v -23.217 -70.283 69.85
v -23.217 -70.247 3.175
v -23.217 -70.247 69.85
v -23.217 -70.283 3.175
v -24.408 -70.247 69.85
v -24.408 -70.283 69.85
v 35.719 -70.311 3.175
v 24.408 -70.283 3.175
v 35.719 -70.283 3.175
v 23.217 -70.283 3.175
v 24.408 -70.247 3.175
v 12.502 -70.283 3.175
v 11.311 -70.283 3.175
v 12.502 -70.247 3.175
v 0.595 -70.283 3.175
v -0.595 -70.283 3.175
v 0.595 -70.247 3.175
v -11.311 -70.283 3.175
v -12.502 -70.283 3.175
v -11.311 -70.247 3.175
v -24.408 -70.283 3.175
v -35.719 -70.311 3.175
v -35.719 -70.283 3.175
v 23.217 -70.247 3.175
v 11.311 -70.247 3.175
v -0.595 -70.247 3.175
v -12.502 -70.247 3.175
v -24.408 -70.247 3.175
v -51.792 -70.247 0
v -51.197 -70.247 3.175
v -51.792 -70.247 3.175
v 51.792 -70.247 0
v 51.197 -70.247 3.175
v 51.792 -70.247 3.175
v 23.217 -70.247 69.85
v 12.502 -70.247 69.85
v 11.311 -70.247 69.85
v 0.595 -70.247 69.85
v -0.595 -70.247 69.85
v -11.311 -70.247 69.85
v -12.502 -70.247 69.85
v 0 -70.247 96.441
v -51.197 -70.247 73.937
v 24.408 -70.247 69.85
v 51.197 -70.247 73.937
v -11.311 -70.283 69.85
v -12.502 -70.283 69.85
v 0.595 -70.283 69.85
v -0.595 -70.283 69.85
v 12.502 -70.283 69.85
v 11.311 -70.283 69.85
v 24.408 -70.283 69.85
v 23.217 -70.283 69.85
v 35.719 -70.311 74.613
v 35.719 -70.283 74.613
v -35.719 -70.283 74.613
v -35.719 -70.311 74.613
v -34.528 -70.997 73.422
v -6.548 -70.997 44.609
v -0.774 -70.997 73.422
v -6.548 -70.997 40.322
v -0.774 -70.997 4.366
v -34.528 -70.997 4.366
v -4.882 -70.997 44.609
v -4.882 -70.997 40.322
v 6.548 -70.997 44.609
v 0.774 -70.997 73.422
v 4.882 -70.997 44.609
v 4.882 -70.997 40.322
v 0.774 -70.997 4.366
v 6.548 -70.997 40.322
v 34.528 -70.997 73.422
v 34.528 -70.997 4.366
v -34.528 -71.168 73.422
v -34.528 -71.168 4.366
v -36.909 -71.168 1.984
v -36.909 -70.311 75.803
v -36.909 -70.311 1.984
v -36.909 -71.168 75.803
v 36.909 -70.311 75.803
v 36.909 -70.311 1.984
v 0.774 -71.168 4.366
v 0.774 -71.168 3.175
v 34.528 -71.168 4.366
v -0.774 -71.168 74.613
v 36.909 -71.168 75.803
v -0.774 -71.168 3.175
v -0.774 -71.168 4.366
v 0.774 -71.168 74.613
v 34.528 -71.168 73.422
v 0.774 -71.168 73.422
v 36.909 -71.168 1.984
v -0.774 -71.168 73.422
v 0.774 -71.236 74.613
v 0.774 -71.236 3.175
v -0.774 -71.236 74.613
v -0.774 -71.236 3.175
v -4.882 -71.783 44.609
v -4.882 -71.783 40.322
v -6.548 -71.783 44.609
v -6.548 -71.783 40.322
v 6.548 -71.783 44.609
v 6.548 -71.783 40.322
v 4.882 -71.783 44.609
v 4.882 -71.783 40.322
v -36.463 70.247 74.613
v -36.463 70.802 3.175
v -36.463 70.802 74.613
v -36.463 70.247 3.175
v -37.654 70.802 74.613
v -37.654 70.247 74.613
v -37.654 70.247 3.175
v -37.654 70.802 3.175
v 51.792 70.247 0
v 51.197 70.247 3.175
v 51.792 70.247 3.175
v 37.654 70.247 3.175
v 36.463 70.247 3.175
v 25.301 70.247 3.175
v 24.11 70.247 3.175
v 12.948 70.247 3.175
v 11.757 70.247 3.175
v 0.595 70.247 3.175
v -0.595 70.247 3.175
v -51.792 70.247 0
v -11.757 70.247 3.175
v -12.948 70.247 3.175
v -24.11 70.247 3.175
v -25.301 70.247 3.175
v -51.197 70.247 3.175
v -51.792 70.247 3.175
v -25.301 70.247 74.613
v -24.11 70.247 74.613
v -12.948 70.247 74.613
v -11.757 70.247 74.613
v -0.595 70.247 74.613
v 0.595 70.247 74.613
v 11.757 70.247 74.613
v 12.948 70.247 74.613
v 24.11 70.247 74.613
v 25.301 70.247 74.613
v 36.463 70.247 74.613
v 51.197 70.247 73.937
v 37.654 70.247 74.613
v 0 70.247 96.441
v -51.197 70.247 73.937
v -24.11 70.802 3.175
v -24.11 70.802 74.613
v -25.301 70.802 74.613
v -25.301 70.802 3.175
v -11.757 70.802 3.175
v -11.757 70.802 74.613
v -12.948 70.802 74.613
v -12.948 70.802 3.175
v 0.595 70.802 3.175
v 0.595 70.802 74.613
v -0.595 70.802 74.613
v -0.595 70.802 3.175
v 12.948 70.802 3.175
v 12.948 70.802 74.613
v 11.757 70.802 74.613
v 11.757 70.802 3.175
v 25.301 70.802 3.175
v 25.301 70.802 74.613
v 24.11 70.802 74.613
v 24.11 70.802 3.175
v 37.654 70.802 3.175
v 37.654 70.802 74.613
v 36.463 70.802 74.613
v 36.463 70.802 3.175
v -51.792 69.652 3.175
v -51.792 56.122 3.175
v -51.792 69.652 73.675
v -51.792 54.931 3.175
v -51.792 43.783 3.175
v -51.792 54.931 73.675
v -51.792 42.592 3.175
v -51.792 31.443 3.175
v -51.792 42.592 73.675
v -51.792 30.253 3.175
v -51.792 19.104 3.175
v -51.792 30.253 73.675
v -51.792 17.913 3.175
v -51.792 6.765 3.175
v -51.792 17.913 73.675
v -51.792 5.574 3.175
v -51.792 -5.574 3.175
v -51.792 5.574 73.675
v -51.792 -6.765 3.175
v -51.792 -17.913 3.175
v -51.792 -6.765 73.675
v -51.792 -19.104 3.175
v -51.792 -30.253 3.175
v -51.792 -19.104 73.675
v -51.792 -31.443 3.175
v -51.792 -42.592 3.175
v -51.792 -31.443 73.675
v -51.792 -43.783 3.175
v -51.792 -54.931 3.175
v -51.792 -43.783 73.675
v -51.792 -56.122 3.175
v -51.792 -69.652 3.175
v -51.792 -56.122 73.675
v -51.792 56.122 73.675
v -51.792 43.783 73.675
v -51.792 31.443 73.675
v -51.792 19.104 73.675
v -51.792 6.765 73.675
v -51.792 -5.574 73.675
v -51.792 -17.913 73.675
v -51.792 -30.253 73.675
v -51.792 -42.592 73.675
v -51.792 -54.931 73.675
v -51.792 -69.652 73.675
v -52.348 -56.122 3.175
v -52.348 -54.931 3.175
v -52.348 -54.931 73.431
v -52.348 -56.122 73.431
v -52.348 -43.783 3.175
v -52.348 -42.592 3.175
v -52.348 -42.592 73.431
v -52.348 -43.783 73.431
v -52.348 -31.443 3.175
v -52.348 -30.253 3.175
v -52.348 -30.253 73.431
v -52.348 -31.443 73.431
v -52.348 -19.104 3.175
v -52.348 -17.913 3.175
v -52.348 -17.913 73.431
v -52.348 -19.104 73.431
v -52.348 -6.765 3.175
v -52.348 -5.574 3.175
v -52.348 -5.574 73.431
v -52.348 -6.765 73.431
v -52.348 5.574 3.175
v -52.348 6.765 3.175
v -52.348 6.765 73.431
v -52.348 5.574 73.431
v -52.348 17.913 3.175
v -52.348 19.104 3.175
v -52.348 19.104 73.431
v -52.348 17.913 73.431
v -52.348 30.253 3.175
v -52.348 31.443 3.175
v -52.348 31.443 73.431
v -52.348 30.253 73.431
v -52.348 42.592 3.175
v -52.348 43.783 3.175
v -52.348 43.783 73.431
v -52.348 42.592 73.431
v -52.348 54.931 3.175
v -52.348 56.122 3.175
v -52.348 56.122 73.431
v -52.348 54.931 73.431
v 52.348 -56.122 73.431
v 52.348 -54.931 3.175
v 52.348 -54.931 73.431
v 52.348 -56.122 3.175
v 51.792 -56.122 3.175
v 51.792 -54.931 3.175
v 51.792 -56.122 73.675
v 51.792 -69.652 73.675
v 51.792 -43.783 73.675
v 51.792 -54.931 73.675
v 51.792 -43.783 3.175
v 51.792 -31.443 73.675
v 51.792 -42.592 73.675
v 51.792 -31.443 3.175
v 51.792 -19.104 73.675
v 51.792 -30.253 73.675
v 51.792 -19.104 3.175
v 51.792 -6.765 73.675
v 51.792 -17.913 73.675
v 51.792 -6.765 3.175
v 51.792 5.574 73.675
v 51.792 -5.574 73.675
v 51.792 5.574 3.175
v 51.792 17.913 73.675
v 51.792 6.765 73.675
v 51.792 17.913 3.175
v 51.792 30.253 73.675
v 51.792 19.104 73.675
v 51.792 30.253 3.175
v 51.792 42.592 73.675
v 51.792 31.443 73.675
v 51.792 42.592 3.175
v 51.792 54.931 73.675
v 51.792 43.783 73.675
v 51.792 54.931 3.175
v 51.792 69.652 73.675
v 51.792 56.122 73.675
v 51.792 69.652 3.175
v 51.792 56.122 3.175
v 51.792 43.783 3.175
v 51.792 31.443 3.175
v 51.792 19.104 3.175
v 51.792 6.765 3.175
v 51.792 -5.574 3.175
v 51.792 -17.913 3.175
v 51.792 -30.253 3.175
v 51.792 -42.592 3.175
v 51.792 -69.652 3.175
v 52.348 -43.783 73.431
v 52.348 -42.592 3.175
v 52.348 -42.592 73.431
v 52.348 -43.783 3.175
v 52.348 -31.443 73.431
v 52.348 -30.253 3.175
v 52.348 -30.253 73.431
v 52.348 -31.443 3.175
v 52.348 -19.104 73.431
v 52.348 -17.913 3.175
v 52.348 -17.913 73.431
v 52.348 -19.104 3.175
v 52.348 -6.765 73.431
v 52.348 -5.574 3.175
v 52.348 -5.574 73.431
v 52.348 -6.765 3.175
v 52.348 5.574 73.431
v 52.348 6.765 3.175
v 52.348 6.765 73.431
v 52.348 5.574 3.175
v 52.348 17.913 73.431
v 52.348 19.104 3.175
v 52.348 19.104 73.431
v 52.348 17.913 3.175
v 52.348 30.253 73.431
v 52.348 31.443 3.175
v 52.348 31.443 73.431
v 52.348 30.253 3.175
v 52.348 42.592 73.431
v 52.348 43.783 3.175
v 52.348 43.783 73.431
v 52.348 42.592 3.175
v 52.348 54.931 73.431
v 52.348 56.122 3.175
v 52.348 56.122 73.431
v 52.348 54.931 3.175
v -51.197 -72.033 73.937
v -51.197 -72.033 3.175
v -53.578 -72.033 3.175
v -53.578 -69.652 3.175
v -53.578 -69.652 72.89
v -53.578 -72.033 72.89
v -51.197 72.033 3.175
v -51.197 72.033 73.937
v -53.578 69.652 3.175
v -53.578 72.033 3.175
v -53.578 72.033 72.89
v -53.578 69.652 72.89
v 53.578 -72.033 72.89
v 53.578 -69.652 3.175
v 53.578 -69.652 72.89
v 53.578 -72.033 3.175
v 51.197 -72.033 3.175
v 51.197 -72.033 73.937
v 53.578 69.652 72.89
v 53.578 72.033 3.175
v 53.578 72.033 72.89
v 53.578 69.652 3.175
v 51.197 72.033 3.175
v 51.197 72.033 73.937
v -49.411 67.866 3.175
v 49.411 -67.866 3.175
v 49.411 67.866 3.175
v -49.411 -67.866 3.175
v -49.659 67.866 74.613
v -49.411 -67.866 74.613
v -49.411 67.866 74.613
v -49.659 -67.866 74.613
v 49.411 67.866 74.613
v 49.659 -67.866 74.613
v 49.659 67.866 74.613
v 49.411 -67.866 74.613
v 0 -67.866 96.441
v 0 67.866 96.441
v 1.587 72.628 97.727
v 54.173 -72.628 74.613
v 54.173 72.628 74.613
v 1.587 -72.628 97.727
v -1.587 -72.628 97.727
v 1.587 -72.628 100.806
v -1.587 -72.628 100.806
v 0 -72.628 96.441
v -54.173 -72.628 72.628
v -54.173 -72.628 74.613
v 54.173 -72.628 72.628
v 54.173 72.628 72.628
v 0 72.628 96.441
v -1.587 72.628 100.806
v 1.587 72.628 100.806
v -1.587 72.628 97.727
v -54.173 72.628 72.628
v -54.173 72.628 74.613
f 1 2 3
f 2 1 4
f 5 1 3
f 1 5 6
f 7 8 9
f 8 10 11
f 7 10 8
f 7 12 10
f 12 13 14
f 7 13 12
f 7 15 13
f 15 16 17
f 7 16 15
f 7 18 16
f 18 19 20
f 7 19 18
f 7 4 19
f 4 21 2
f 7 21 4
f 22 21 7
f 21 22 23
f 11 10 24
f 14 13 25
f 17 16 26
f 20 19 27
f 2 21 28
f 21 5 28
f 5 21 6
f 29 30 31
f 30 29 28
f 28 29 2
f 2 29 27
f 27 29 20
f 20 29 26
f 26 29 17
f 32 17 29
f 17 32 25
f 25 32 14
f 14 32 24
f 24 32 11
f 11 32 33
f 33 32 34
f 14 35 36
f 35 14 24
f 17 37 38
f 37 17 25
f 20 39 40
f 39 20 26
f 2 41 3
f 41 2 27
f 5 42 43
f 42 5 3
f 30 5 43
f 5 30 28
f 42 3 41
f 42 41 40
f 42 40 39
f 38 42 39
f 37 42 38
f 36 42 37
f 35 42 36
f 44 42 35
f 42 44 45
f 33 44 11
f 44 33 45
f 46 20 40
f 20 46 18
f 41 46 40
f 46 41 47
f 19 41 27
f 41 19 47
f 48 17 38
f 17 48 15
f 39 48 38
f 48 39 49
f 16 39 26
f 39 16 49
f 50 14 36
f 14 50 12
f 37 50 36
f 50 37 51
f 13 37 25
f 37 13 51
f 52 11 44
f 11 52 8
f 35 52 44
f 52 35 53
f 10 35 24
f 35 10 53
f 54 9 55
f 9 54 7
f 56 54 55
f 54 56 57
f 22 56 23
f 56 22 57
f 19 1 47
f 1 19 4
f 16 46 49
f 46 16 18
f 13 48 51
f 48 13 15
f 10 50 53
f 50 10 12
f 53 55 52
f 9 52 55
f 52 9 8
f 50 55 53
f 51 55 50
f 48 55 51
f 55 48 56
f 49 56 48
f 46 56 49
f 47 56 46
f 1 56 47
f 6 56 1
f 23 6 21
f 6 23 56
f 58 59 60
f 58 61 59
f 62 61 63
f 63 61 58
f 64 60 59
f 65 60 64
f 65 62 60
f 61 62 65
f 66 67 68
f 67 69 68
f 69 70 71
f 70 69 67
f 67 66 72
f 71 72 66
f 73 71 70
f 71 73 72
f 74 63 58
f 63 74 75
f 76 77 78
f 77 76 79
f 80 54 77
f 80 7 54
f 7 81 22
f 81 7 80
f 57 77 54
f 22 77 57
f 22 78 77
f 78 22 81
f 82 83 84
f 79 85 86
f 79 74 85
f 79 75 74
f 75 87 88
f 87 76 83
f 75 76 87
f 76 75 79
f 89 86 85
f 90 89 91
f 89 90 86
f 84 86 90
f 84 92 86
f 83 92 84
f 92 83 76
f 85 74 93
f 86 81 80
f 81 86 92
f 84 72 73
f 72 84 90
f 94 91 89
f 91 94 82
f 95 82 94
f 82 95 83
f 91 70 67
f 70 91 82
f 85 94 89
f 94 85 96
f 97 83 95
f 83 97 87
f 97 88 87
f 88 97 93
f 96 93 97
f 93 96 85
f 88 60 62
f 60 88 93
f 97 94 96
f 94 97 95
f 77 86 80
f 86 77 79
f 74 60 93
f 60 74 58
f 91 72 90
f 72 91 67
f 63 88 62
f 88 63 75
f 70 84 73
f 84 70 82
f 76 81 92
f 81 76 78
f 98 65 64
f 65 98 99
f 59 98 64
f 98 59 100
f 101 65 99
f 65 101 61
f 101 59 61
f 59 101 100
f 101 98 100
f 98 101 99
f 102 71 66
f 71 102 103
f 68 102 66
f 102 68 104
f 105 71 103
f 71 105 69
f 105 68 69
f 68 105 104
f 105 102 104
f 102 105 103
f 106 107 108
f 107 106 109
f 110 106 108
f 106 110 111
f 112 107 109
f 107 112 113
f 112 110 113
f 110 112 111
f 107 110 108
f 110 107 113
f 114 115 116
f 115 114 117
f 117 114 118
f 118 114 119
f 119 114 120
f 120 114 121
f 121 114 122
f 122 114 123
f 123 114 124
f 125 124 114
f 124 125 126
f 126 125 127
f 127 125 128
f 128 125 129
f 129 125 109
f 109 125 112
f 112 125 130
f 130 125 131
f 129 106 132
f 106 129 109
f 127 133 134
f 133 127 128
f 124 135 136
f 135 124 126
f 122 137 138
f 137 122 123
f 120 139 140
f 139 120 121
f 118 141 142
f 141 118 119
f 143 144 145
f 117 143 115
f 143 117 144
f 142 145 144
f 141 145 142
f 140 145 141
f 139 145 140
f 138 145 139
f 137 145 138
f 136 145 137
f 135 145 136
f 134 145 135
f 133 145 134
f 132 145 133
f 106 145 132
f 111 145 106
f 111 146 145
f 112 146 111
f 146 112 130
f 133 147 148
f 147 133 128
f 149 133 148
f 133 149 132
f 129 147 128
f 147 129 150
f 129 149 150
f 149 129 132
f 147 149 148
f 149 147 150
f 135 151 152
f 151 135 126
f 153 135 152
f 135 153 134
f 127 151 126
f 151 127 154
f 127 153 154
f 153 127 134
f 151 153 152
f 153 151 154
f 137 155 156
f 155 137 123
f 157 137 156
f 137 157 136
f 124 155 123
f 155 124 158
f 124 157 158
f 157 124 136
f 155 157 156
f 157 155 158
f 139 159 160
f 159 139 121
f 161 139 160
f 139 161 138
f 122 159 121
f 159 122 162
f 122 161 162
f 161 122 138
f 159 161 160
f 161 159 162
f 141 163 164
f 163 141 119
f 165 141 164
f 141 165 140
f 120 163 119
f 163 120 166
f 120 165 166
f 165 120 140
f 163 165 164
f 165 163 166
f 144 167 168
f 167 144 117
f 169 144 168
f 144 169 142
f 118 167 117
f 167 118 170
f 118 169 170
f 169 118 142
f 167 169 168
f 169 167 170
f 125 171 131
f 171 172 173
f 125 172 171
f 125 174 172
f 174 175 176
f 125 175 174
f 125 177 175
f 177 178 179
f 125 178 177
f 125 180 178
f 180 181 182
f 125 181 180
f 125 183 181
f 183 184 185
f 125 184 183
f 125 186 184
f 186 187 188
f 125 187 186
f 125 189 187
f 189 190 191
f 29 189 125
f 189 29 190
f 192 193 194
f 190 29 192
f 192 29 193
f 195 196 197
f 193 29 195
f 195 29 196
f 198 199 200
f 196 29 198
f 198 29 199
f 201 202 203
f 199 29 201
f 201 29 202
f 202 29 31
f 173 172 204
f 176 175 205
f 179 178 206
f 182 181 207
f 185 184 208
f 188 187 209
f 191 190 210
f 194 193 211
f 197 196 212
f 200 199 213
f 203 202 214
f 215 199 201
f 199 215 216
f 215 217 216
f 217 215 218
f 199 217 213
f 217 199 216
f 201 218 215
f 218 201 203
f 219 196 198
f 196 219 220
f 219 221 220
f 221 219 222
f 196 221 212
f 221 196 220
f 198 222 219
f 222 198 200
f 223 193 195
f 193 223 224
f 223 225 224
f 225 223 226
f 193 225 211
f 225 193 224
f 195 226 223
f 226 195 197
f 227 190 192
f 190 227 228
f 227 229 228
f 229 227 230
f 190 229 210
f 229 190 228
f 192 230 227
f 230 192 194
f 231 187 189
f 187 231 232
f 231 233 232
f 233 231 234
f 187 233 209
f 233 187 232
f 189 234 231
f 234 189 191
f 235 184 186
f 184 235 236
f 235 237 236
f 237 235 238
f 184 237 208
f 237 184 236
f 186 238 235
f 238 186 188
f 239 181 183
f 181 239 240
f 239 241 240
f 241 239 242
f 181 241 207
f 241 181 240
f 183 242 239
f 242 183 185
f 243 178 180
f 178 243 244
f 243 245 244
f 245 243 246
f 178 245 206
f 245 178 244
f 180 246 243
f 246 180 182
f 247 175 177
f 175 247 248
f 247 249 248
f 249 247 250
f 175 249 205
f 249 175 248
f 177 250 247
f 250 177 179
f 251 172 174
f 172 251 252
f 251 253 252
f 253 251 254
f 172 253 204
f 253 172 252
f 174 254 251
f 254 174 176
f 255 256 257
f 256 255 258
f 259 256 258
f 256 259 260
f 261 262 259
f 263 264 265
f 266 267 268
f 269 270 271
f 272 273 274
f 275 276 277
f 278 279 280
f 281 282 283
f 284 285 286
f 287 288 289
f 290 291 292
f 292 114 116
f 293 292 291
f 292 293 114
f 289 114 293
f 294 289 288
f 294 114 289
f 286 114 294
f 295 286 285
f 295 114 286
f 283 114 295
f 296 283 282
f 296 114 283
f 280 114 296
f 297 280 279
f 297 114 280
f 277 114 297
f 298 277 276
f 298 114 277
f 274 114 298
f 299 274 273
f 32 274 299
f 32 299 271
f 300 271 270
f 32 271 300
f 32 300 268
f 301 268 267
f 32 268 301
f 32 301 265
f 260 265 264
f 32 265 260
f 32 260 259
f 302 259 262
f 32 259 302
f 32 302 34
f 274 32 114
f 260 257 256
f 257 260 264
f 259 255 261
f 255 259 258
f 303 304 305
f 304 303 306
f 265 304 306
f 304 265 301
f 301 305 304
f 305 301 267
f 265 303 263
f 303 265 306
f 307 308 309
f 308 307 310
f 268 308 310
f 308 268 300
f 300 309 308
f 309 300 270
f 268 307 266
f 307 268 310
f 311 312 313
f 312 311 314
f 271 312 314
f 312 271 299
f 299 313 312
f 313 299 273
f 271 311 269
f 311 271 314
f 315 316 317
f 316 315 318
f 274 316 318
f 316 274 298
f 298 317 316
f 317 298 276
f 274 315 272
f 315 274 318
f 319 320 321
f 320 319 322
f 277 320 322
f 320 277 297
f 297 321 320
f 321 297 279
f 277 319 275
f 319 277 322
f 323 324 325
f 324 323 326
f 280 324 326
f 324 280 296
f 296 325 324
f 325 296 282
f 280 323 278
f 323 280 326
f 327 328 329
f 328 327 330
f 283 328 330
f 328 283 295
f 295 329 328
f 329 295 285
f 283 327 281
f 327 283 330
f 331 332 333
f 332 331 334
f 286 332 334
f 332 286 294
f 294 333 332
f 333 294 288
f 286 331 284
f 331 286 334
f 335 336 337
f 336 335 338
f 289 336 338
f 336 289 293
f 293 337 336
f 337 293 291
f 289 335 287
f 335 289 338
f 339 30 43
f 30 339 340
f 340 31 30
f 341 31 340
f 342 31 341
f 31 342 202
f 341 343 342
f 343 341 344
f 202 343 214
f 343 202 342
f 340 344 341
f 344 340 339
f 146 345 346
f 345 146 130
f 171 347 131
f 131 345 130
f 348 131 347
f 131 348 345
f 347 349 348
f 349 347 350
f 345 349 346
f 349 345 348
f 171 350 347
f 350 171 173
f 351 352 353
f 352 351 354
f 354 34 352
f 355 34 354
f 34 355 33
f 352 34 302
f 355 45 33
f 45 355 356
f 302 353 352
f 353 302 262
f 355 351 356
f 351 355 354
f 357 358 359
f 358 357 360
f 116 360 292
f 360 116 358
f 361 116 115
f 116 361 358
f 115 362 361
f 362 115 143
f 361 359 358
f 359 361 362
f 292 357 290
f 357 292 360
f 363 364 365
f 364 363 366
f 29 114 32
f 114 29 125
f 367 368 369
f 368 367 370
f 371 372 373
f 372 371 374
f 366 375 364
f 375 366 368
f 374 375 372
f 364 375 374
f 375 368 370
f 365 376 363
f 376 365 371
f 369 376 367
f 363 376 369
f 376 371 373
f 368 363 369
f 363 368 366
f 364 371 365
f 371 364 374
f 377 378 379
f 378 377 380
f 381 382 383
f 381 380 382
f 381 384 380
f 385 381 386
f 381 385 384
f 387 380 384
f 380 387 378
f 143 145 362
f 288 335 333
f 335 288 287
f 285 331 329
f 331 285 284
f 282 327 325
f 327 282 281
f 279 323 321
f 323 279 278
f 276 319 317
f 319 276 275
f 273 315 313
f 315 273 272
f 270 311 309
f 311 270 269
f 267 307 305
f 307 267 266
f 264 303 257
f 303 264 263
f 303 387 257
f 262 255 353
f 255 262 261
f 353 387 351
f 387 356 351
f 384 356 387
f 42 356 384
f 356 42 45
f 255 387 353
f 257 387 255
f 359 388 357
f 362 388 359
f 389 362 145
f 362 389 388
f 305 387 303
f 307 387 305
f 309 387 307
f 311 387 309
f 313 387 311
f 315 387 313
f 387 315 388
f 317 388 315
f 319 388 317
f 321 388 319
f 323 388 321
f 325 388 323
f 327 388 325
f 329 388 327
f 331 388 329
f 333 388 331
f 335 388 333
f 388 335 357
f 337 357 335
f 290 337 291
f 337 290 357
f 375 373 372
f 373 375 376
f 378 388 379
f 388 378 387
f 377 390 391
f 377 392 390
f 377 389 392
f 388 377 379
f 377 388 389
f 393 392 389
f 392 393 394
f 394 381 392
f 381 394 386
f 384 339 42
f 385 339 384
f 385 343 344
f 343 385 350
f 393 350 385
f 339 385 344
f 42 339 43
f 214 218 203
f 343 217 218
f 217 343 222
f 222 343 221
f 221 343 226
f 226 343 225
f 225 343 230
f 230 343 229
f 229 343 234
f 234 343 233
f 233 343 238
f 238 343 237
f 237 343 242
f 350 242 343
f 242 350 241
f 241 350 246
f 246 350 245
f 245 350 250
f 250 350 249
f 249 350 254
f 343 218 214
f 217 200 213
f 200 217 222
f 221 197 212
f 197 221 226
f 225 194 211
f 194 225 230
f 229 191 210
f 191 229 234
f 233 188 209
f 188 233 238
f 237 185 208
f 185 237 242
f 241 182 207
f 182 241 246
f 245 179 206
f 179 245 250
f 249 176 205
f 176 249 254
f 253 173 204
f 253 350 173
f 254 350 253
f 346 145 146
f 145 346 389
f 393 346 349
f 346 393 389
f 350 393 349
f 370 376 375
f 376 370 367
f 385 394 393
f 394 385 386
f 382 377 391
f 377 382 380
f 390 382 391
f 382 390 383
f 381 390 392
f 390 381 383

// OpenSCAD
// Greg Allen shed - corrected rectangular Bambu Lab P1S model
// Source: uploaded handwritten shop drawings.
// Corrected interpretation: the shed is square-cornered / rectangular in plan, not tapered.
// Units in this file are millimeters. Source dimensions are inches, scaled 1:16.
// Drawing dimensions used: width 62.25", depth 85.5", eave height 45", ridge height 60".

$fn = 48;
scale_factor = 16;
function inch(v) = v * 25.4 / scale_factor;

shed_width = inch(62.25);
shed_depth = inch(85.5);
eave_height = inch(45);
ridge_height = inch(60);
base_height = inch(2);
wall_t = inch(1.5);
roof_t = inch(1.25);
roof_overhang_front_back = inch(3);
roof_overhang_sides = inch(3);

batten_spacing = inch(7.5);
batten_w = max(inch(0.75), 0.65);
batten_d = max(inch(0.35), 0.45);
trim_w = max(inch(1.5), 1.0);
trim_d = max(inch(0.45), 0.55);
ridge_cap_w = inch(2);

y_front = -shed_depth / 2;
y_back = shed_depth / 2;
z0 = base_height;
z_eave = z0 + eave_height;
z_peak = z0 + ridge_height;

module centered_box(size, center_point, rz = 0) {
  translate(center_point)
    rotate([0, 0, rz])
      cube(size, center = true);
}

module triangle_prism(xl, xr, yc, t, zbase, zpeak) {
  y0 = yc - t / 2;
  y1 = yc + t / 2;
  polyhedron(
    points = [
      [xl, y0, zbase], [xr, y0, zbase], [0, y0, zpeak],
      [xl, y1, zbase], [xr, y1, zbase], [0, y1, zpeak]
    ],
    faces = [
      [0, 2, 1], [3, 4, 5],
      [0, 1, 4, 3], [1, 2, 5, 4], [2, 0, 3, 5]
    ]
  );
}

module quad_plate(p0, p1, p2, p3, t) {
  polyhedron(
    points = [p0, p1, p2, p3, [p0[0],p0[1],p0[2]-t], [p1[0],p1[1],p1[2]-t], [p2[0],p2[1],p2[2]-t], [p3[0],p3[1],p3[2]-t]],
    faces = [
      [0,1,2,3], [7,6,5,4],
      [0,4,5,1], [1,5,6,2], [2,6,7,3], [3,7,4,0]
    ]
  );
}

module front_back_battens(y, width, height = eave_height) {
  count = max(2, floor(width / batten_spacing));
  for (i = [1 : count - 1]) {
    x = -width / 2 + width * i / count;
    centered_box([batten_w, batten_d, height], [x, y, z0 + height / 2]);
  }
}

module side_battens(x, depth, height = eave_height) {
  count = max(2, floor(depth / batten_spacing));
  for (i = [1 : count - 1]) {
    y = -depth / 2 + depth * i / count;
    centered_box([batten_d, batten_w, height], [x, y, z0 + height / 2]);
  }
}

module door_detail() {
  door_w = inch(45);
  door_h = inch(45);
  door_y = y_front - wall_t - trim_d * 0.55;
  centered_box([door_w, trim_d, door_h], [0, door_y, z0 + door_h / 2]);
  centered_box([trim_w, trim_d * 1.2, door_h], [-door_w / 2, door_y - 0.1, z0 + door_h / 2]);
  centered_box([trim_w, trim_d * 1.2, door_h], [door_w / 2, door_y - 0.1, z0 + door_h / 2]);
  centered_box([trim_w * 0.65, trim_d * 1.25, door_h], [0, door_y - 0.15, z0 + door_h / 2]);
  centered_box([door_w + trim_w, trim_d * 1.2, trim_w], [0, door_y - 0.1, z0 + door_h]);
  centered_box([door_w + trim_w, trim_d * 1.2, trim_w], [0, door_y - 0.1, z0]);
  centered_box([trim_w * 0.7, trim_d * 1.6, trim_w * 1.8], [-door_w * 0.08, door_y - trim_d * 0.8, z0 + door_h * 0.55]);
  centered_box([trim_w * 0.7, trim_d * 1.6, trim_w * 1.8], [door_w * 0.08, door_y - trim_d * 0.8, z0 + door_h * 0.55]);
  front_back_battens(y_front - wall_t - batten_d / 2, door_w, door_h - 2 * trim_w);
}

module shed_model() {
  centered_box([shed_width + 2 * wall_t, shed_depth + 2 * wall_t, base_height], [0, 0, base_height / 2]);
  centered_box([shed_width + 2 * wall_t, wall_t, eave_height], [0, y_front - wall_t / 2, z0 + eave_height / 2]);
  centered_box([shed_width + 2 * wall_t, wall_t, eave_height], [0, y_back + wall_t / 2, z0 + eave_height / 2]);
  centered_box([wall_t, shed_depth, eave_height], [-shed_width / 2 - wall_t / 2, 0, z0 + eave_height / 2]);
  centered_box([wall_t, shed_depth, eave_height], [shed_width / 2 + wall_t / 2, 0, z0 + eave_height / 2]);
  triangle_prism(-shed_width / 2 - wall_t, shed_width / 2 + wall_t, y_front - wall_t / 2, wall_t, z_eave, z_peak);
  triangle_prism(-shed_width / 2 - wall_t, shed_width / 2 + wall_t, y_back + wall_t / 2, wall_t, z_eave, z_peak);

  quad_plate([0, y_front - roof_overhang_front_back, z_peak], [0, y_back + roof_overhang_front_back, z_peak], [shed_width / 2 + roof_overhang_sides, y_back + roof_overhang_front_back, z_eave], [shed_width / 2 + roof_overhang_sides, y_front - roof_overhang_front_back, z_eave], roof_t);
  quad_plate([0, y_back + roof_overhang_front_back, z_peak], [0, y_front - roof_overhang_front_back, z_peak], [-shed_width / 2 - roof_overhang_sides, y_front - roof_overhang_front_back, z_eave], [-shed_width / 2 - roof_overhang_sides, y_back + roof_overhang_front_back, z_eave], roof_t);
  centered_box([ridge_cap_w, shed_depth + 2 * roof_overhang_front_back, ridge_cap_w], [0, 0, z_peak + ridge_cap_w * 0.25]);

  door_detail();
  front_back_battens(y_back + wall_t + batten_d / 2, shed_width, eave_height);
  side_battens(-shed_width / 2 - wall_t - batten_d / 2, shed_depth, eave_height);
  side_battens(shed_width / 2 + wall_t + batten_d / 2, shed_depth, eave_height);

  for (sx = [-1, 1]) for (sy = [-1, 1])
    centered_box([trim_w, trim_w, eave_height], [sx * (shed_width / 2 + wall_t + trim_w / 4), sy * (shed_depth / 2 + wall_t + trim_w / 4), z0 + eave_height / 2]);
}

shed_model();
